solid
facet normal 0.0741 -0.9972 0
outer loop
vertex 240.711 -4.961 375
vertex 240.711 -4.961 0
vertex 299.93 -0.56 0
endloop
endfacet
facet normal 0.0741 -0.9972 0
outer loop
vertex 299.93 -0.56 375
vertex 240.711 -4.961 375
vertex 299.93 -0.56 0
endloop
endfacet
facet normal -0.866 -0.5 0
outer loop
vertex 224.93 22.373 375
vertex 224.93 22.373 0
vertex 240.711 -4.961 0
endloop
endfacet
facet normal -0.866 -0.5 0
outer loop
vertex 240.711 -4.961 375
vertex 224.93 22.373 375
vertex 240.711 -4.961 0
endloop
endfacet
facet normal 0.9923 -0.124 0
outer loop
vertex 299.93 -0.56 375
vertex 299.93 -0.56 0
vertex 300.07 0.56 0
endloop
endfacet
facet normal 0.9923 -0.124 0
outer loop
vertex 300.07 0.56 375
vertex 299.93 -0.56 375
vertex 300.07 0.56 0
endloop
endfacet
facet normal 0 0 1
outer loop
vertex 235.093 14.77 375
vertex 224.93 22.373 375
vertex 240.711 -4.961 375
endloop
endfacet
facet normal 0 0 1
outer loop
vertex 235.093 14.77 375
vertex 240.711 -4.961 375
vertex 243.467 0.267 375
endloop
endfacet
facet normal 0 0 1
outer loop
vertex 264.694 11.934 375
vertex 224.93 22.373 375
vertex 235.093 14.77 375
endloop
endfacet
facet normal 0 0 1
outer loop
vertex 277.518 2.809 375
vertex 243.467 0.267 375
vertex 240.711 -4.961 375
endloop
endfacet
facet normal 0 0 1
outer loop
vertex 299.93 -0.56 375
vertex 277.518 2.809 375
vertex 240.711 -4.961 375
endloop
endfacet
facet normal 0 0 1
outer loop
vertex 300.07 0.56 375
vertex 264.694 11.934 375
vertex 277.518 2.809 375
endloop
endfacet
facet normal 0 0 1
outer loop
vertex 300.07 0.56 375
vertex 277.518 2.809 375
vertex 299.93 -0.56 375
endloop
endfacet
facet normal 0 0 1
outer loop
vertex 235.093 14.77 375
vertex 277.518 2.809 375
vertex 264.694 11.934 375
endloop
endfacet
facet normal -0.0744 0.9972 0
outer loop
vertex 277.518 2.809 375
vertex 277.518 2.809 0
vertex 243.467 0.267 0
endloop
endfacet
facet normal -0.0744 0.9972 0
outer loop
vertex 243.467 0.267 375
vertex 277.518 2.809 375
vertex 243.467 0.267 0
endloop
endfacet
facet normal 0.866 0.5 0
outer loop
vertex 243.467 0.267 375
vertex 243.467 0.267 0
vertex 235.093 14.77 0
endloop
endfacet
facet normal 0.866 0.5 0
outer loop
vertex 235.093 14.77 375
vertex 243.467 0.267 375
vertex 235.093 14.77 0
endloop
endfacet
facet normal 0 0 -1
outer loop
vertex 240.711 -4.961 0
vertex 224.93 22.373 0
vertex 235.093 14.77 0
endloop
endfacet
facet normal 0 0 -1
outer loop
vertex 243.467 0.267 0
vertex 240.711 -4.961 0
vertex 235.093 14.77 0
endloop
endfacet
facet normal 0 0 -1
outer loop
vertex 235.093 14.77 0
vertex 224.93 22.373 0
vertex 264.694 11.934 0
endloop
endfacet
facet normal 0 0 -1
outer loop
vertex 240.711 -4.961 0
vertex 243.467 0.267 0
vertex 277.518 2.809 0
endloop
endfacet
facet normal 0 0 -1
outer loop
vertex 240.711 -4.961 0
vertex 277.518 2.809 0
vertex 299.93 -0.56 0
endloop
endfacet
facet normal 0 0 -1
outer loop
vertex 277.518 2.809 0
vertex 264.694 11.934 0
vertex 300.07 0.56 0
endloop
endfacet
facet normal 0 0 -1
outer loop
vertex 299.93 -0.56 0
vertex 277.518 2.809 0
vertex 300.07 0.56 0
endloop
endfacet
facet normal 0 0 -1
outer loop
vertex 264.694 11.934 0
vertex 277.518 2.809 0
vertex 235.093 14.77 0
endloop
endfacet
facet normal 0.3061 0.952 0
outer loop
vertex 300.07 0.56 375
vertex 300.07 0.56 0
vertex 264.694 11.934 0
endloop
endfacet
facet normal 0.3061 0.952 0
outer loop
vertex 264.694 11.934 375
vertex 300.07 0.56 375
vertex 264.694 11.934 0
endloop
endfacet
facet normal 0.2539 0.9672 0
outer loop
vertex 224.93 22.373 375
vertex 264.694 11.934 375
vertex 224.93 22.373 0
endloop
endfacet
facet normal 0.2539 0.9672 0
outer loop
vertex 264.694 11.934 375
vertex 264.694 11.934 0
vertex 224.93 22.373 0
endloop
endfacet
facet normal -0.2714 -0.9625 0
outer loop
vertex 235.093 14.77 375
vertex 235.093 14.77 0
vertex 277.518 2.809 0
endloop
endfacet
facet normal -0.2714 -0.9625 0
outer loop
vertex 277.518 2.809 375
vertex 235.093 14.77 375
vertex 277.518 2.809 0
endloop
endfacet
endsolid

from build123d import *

# Parameters (mm, degrees)
BOSS_EXTRUDE1_DEPTH = 375


with BuildPart() as part:
    # Master sketch-Wing Geometry Master Sketc → Boss-Extrude1 (new body)
    with BuildSketch(Plane.XY):
        with BuildLine():
            Line((299.93, -0.56), (300.07, 0.56))
            add(Edge.make_bspline(
                [(300.07, 0.56), (300.046727211, 0.570149465), (299.951918411, 0.611496405), (299.73145109, 0.687910176), (299.360701306, 0.80207776), (298.851143071, 0.99004976), (298.192762058, 1.214989557), (297.390581316, 1.498347711), (296.440162644, 1.827131445), (295.347552696, 2.205915898), (294.109915848, 2.626416664), (292.734867315, 3.097875543), (291.212205014, 3.603301609), (289.556778296, 4.170360104), (287.754541524, 4.750229424), (285.826587723, 5.399922294), (283.756363975, 6.062421055), (281.558560221, 6.775887077), (279.22562543, 7.517307408), (276.759052146, 8.280298176), (274.172767845, 9.09557711), (271.459553567, 9.926240206), (268.620233525, 10.77076618), (265.667031068, 11.655929728), (262.589976024, 12.539934752), (259.406507793, 13.464429613), (256.106091201, 14.393267862), (252.694259979, 15.330032696), (249.183398904, 16.29260897), (245.565461503, 17.251434656), (241.852861879, 18.22108263), (238.042855476, 19.19138103), (234.140998952, 20.15735732), (230.154027103, 21.143304457), (227.071354515, 21.873459433), (225.320067796, 22.282419133), (224.93, 22.373189537)],
                knots=[0, 0, 0, 0, 0.000121802, 0.000496198, 0.001118298, 0.001983272, 0.003101095, 0.004456671, 0.0060651, 0.00792639, 0.010005101, 0.012336683, 0.014900868, 0.017702772, 0.020732285, 0.023984296, 0.027464026, 0.031161268, 0.035071154, 0.039209025, 0.043549161, 0.048082096, 0.052823294, 0.05776212, 0.062874254, 0.068184085, 0.073667486, 0.07932465, 0.085159937, 0.091134213, 0.09728269, 0.103570554, 0.109998008, 0.116569035, 0.123276218, 0.125197771, 0.125197771, 0.125197771, 0.125197771], degree=3))
            Line((224.93, 22.373189537), (240.711180377, -4.960616679))
            add(Edge.make_bspline(
                [(240.711180377, -4.960616679), (241.664163028, -4.887637656), (243.840258172, -4.718440324), (247.20981219, -4.46085993), (250.787106765, -4.195760616), (254.266072169, -3.918835614), (257.64325016, -3.672183933), (260.913793207, -3.436175985), (264.072684975, -3.187909636), (267.117194027, -2.977146375), (270.04316125, -2.751013416), (272.846765874, -2.544700113), (275.529429199, -2.33878816), (278.087148077, -2.166666674), (280.513268395, -1.982425314), (282.806745266, -1.814435769), (284.962823137, -1.649552143), (286.983837234, -1.517010694), (288.863257365, -1.37227381), (290.600165156, -1.245587565), (292.192790163, -1.119159502), (293.640594786, -1.028164187), (294.939565333, -0.920704317), (296.089960301, -0.842870725), (297.090587221, -0.777681987), (297.939585238, -0.701301857), (298.63665195, -0.653077401), (299.177018782, -0.618208827), (299.562595702, -0.575799674), (299.797349193, -0.578243239), (299.903360171, -0.56366373), (299.93, -0.56)],
                knots=[0.905027219, 0.905027219, 0.905027219, 0.905027219, 0.909613035, 0.915499668, 0.921241563, 0.92682399, 0.932244523, 0.93748843, 0.942556897, 0.947447555, 0.952130861, 0.956637537, 0.960935685, 0.965040102, 0.968937144, 0.972609709, 0.976073746, 0.979312161, 0.982327244, 0.985117851, 0.987668032, 0.989992582, 0.992077865, 0.99392155, 0.995524803, 0.996888844, 0.998011233, 0.998877243, 0.999486883, 0.999871057, 1, 1, 1, 1], degree=3))
        make_face()
        Polygon((277.5184867, 2.809088635), (243.466590848, 0.266872389), (235.093272506, 14.769885184), align=None, mode=Mode.SUBTRACT)
    extrude(amount=BOSS_EXTRUDE1_DEPTH)


solid = part.part
